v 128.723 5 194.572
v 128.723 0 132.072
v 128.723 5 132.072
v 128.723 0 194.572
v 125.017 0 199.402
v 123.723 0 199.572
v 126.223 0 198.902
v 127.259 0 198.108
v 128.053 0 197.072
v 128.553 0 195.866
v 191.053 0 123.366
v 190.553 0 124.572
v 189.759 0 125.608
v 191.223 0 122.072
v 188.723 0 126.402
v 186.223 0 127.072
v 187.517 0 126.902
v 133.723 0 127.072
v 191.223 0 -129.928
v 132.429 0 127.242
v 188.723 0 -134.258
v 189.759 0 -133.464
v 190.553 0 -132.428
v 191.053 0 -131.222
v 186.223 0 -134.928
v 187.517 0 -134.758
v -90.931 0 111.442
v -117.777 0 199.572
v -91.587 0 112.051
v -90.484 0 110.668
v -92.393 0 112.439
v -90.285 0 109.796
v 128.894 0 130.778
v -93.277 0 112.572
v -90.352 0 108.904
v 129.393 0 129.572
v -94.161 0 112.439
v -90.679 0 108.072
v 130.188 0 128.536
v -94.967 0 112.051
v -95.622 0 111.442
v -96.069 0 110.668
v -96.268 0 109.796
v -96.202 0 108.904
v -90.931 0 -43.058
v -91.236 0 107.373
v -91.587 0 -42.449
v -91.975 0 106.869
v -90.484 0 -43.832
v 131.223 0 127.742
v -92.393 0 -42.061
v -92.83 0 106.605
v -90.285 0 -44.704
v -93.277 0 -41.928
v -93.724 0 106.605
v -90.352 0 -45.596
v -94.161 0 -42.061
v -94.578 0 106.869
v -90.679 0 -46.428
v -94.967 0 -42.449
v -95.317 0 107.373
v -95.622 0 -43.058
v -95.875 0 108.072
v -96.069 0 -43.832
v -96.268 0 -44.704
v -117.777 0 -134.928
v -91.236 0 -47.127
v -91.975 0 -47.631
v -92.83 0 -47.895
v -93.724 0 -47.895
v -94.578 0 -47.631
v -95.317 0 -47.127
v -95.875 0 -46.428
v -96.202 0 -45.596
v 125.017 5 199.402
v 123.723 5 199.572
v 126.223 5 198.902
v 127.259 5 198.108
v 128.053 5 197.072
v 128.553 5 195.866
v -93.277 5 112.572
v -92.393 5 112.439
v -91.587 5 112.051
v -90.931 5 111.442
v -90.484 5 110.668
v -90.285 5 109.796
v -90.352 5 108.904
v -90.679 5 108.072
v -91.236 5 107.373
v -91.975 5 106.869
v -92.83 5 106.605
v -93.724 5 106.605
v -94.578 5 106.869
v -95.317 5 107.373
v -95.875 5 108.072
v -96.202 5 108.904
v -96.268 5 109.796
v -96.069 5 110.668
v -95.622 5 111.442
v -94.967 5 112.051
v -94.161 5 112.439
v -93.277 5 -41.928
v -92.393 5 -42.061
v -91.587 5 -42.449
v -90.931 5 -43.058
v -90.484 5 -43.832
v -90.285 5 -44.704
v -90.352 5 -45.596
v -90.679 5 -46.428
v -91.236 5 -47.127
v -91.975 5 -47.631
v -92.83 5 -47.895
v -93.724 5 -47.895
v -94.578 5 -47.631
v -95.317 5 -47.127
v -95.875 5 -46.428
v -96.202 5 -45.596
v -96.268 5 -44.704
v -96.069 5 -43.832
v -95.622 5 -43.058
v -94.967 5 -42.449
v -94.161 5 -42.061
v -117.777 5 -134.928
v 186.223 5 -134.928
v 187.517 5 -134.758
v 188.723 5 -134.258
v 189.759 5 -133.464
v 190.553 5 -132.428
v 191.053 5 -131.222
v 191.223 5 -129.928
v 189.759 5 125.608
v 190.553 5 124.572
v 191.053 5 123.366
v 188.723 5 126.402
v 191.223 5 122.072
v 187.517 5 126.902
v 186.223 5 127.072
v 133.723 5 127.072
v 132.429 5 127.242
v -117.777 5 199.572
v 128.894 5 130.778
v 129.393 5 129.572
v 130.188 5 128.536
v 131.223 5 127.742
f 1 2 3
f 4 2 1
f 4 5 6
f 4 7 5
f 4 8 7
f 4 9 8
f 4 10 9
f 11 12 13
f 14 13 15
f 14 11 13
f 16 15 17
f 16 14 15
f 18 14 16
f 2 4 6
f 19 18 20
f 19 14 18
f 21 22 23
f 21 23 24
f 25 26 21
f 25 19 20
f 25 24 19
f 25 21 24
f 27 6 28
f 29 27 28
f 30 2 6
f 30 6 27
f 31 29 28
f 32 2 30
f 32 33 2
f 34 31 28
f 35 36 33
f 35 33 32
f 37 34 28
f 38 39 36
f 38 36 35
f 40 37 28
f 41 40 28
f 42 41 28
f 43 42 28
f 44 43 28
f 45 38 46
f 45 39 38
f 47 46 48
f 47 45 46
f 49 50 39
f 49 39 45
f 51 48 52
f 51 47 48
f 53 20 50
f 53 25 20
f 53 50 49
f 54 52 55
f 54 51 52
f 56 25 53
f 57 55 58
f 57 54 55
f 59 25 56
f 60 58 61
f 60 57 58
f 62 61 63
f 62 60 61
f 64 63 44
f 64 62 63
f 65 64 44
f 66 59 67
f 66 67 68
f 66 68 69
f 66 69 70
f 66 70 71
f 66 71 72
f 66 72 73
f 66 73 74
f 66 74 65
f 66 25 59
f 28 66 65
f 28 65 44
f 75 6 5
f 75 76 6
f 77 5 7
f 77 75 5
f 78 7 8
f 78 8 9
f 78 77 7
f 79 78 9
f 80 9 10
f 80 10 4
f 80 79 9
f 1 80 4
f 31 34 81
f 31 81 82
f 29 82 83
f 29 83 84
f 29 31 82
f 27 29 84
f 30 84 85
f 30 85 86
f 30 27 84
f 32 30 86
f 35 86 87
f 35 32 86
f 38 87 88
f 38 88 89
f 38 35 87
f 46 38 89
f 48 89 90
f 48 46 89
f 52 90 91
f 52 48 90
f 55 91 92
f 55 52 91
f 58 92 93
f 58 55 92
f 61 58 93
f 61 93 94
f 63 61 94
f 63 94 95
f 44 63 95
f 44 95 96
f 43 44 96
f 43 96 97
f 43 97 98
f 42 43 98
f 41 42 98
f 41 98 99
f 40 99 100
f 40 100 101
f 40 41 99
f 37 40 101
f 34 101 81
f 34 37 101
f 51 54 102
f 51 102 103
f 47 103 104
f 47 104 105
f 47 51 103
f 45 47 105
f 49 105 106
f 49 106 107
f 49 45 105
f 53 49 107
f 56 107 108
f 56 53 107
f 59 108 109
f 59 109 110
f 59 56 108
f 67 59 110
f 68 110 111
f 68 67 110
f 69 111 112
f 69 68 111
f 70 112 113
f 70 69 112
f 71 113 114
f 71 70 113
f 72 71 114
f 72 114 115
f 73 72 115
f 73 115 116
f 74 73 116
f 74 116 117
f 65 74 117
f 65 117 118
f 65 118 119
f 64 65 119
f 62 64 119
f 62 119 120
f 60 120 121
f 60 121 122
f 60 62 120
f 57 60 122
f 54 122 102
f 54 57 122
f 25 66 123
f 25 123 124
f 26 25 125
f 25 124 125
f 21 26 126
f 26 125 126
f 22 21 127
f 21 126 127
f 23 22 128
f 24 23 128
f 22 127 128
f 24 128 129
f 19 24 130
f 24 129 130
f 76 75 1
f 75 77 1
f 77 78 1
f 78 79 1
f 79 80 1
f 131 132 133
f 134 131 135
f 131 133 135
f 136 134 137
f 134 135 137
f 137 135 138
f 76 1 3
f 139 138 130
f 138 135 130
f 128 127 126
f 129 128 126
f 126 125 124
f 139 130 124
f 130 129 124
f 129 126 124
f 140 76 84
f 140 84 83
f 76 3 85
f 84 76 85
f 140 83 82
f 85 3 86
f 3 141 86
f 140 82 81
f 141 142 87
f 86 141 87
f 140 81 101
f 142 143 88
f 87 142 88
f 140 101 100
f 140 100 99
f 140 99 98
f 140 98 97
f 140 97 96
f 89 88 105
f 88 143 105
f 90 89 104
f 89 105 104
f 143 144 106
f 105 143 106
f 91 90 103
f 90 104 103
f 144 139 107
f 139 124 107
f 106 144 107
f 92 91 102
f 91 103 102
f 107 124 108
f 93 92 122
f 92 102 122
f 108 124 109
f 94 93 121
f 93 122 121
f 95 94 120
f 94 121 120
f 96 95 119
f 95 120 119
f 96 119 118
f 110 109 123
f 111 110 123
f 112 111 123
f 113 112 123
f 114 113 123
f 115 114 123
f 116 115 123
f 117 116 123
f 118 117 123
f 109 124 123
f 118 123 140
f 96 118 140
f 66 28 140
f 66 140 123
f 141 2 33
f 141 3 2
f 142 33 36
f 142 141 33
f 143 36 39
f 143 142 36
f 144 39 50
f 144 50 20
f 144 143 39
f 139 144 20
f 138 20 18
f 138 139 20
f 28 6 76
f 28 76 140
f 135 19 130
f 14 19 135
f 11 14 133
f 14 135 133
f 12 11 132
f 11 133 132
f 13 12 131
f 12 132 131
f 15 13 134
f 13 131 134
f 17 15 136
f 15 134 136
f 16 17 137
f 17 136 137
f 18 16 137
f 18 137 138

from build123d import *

# Parameters (mm, degrees)
CROQUIS1_R              = 3
SALIENTE_EXTRUIR1_DEPTH = 5
REDONDEO1_R             = 5


with BuildPart() as part:
    # Croquis1 → Saliente-Extruir1 (new body)
    with BuildSketch(Plane(origin=(0, 0, 0), x_dir=(1, 0, 0), z_dir=(0, 1, 0))):
        Polygon((-117.776848249, -199.571984436), (-117.776848249, 134.928015564), (191.223151751, 134.928015564), (191.223151751, -127.071984436), (128.723151751, -127.071984436), (128.723151751, -199.571984436), align=None)
        with Locations(Location((-93.276848249, 44.928015564, 0), (0, 0, 270))):
            Circle(CROQUIS1_R, mode=Mode.SUBTRACT)
        with Locations(Location((-93.276848249, -109.571984436, 0), (0, 0, 270))):
            Circle(CROQUIS1_R, mode=Mode.SUBTRACT)
    extrude(amount=SALIENTE_EXTRUIR1_DEPTH)

    # Redondeo1
    redondeo1_edges = [part.edges().sort_by_distance(p)[0] for p in [
        (191.223151751, 2.5, 127.071984436),
        (128.723151751, 2.5, 127.071984436),
        (128.723151751, 2.5, 199.571984436),
        (191.223151751, 2.5, -134.928015564),
    ]]
    fillet(redondeo1_edges, radius=REDONDEO1_R)


solid = part.part
